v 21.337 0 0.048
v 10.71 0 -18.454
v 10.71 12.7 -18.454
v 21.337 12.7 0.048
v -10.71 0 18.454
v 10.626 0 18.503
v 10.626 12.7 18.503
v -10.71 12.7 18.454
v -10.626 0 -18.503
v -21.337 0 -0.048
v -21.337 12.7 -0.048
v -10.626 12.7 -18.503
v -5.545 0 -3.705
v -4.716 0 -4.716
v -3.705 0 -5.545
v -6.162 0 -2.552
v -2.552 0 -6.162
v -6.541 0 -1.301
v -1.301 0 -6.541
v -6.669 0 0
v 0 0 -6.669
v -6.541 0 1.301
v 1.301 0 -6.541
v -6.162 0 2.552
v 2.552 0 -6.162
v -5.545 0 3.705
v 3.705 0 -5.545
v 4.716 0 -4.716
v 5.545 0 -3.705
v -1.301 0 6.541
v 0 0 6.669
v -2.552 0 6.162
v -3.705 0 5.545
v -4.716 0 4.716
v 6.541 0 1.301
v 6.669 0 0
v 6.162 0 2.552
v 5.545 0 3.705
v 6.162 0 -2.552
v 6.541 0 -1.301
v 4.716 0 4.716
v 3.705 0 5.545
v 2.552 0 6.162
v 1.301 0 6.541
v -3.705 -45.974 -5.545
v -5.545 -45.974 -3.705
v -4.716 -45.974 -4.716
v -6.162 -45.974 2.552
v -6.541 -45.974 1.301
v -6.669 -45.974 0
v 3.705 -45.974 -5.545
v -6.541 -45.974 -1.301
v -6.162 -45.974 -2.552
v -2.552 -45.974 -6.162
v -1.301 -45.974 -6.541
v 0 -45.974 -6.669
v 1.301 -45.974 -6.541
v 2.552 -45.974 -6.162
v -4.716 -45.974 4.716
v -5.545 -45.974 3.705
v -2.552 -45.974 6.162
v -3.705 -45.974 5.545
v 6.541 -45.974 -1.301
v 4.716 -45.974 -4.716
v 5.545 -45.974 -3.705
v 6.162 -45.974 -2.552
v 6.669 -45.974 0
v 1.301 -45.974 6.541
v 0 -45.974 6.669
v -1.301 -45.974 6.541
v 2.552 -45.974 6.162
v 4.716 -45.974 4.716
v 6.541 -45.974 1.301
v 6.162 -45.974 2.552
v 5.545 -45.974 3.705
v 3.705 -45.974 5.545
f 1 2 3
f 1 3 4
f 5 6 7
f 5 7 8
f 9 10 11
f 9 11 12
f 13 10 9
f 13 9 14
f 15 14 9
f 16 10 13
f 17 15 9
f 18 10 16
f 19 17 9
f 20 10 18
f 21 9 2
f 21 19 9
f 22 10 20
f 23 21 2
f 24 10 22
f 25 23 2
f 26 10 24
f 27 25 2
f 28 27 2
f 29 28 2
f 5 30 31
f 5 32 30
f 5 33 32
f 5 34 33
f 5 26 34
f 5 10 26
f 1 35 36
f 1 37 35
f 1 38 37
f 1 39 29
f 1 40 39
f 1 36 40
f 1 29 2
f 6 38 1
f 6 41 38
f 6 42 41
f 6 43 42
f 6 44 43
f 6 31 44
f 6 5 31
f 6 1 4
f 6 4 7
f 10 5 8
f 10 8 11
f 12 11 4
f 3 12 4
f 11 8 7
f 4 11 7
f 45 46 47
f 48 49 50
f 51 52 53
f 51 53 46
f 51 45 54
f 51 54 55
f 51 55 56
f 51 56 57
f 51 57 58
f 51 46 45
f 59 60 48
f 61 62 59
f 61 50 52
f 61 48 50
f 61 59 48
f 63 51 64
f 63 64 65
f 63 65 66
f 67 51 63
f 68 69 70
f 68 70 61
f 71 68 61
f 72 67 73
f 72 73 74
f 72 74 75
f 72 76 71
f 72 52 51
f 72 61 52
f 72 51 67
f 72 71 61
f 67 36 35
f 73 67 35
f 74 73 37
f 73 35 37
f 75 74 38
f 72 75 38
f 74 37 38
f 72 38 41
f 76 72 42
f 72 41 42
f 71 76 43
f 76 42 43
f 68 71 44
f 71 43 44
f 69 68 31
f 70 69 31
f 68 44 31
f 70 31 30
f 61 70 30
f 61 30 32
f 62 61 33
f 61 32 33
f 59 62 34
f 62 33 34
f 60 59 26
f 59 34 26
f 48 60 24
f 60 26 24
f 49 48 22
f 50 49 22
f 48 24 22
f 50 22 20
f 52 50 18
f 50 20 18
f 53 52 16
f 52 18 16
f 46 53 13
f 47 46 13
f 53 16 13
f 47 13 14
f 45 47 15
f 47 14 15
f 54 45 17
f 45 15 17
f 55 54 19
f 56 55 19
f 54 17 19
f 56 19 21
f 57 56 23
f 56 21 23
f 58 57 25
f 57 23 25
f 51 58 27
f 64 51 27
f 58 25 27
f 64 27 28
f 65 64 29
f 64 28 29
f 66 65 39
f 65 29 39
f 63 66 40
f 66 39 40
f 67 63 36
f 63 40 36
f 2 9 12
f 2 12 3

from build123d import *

# Parameters (mm, degrees)
F1_DEPTH = 12.7
F2_R     = 6.669357
F3_DEPTH = 45.974


with BuildPart() as f1:
    # F0 (on Front) → F1 (new body)
    with BuildSketch(Plane.XZ):
        Polygon((-10.710431, 18.454035), (-21.336878, -0.048488), (-10.626448, -18.502522), (10.710431, -18.454035), (21.336878, 0.048488), (10.626448, 18.502522), align=None)
    extrude(amount=-F1_DEPTH)

    # F2 (on face) → F3 (join)
    with BuildSketch(Plane.XZ):
        Circle(F2_R)
    extrude(amount=F3_DEPTH)


solid = f1.part
